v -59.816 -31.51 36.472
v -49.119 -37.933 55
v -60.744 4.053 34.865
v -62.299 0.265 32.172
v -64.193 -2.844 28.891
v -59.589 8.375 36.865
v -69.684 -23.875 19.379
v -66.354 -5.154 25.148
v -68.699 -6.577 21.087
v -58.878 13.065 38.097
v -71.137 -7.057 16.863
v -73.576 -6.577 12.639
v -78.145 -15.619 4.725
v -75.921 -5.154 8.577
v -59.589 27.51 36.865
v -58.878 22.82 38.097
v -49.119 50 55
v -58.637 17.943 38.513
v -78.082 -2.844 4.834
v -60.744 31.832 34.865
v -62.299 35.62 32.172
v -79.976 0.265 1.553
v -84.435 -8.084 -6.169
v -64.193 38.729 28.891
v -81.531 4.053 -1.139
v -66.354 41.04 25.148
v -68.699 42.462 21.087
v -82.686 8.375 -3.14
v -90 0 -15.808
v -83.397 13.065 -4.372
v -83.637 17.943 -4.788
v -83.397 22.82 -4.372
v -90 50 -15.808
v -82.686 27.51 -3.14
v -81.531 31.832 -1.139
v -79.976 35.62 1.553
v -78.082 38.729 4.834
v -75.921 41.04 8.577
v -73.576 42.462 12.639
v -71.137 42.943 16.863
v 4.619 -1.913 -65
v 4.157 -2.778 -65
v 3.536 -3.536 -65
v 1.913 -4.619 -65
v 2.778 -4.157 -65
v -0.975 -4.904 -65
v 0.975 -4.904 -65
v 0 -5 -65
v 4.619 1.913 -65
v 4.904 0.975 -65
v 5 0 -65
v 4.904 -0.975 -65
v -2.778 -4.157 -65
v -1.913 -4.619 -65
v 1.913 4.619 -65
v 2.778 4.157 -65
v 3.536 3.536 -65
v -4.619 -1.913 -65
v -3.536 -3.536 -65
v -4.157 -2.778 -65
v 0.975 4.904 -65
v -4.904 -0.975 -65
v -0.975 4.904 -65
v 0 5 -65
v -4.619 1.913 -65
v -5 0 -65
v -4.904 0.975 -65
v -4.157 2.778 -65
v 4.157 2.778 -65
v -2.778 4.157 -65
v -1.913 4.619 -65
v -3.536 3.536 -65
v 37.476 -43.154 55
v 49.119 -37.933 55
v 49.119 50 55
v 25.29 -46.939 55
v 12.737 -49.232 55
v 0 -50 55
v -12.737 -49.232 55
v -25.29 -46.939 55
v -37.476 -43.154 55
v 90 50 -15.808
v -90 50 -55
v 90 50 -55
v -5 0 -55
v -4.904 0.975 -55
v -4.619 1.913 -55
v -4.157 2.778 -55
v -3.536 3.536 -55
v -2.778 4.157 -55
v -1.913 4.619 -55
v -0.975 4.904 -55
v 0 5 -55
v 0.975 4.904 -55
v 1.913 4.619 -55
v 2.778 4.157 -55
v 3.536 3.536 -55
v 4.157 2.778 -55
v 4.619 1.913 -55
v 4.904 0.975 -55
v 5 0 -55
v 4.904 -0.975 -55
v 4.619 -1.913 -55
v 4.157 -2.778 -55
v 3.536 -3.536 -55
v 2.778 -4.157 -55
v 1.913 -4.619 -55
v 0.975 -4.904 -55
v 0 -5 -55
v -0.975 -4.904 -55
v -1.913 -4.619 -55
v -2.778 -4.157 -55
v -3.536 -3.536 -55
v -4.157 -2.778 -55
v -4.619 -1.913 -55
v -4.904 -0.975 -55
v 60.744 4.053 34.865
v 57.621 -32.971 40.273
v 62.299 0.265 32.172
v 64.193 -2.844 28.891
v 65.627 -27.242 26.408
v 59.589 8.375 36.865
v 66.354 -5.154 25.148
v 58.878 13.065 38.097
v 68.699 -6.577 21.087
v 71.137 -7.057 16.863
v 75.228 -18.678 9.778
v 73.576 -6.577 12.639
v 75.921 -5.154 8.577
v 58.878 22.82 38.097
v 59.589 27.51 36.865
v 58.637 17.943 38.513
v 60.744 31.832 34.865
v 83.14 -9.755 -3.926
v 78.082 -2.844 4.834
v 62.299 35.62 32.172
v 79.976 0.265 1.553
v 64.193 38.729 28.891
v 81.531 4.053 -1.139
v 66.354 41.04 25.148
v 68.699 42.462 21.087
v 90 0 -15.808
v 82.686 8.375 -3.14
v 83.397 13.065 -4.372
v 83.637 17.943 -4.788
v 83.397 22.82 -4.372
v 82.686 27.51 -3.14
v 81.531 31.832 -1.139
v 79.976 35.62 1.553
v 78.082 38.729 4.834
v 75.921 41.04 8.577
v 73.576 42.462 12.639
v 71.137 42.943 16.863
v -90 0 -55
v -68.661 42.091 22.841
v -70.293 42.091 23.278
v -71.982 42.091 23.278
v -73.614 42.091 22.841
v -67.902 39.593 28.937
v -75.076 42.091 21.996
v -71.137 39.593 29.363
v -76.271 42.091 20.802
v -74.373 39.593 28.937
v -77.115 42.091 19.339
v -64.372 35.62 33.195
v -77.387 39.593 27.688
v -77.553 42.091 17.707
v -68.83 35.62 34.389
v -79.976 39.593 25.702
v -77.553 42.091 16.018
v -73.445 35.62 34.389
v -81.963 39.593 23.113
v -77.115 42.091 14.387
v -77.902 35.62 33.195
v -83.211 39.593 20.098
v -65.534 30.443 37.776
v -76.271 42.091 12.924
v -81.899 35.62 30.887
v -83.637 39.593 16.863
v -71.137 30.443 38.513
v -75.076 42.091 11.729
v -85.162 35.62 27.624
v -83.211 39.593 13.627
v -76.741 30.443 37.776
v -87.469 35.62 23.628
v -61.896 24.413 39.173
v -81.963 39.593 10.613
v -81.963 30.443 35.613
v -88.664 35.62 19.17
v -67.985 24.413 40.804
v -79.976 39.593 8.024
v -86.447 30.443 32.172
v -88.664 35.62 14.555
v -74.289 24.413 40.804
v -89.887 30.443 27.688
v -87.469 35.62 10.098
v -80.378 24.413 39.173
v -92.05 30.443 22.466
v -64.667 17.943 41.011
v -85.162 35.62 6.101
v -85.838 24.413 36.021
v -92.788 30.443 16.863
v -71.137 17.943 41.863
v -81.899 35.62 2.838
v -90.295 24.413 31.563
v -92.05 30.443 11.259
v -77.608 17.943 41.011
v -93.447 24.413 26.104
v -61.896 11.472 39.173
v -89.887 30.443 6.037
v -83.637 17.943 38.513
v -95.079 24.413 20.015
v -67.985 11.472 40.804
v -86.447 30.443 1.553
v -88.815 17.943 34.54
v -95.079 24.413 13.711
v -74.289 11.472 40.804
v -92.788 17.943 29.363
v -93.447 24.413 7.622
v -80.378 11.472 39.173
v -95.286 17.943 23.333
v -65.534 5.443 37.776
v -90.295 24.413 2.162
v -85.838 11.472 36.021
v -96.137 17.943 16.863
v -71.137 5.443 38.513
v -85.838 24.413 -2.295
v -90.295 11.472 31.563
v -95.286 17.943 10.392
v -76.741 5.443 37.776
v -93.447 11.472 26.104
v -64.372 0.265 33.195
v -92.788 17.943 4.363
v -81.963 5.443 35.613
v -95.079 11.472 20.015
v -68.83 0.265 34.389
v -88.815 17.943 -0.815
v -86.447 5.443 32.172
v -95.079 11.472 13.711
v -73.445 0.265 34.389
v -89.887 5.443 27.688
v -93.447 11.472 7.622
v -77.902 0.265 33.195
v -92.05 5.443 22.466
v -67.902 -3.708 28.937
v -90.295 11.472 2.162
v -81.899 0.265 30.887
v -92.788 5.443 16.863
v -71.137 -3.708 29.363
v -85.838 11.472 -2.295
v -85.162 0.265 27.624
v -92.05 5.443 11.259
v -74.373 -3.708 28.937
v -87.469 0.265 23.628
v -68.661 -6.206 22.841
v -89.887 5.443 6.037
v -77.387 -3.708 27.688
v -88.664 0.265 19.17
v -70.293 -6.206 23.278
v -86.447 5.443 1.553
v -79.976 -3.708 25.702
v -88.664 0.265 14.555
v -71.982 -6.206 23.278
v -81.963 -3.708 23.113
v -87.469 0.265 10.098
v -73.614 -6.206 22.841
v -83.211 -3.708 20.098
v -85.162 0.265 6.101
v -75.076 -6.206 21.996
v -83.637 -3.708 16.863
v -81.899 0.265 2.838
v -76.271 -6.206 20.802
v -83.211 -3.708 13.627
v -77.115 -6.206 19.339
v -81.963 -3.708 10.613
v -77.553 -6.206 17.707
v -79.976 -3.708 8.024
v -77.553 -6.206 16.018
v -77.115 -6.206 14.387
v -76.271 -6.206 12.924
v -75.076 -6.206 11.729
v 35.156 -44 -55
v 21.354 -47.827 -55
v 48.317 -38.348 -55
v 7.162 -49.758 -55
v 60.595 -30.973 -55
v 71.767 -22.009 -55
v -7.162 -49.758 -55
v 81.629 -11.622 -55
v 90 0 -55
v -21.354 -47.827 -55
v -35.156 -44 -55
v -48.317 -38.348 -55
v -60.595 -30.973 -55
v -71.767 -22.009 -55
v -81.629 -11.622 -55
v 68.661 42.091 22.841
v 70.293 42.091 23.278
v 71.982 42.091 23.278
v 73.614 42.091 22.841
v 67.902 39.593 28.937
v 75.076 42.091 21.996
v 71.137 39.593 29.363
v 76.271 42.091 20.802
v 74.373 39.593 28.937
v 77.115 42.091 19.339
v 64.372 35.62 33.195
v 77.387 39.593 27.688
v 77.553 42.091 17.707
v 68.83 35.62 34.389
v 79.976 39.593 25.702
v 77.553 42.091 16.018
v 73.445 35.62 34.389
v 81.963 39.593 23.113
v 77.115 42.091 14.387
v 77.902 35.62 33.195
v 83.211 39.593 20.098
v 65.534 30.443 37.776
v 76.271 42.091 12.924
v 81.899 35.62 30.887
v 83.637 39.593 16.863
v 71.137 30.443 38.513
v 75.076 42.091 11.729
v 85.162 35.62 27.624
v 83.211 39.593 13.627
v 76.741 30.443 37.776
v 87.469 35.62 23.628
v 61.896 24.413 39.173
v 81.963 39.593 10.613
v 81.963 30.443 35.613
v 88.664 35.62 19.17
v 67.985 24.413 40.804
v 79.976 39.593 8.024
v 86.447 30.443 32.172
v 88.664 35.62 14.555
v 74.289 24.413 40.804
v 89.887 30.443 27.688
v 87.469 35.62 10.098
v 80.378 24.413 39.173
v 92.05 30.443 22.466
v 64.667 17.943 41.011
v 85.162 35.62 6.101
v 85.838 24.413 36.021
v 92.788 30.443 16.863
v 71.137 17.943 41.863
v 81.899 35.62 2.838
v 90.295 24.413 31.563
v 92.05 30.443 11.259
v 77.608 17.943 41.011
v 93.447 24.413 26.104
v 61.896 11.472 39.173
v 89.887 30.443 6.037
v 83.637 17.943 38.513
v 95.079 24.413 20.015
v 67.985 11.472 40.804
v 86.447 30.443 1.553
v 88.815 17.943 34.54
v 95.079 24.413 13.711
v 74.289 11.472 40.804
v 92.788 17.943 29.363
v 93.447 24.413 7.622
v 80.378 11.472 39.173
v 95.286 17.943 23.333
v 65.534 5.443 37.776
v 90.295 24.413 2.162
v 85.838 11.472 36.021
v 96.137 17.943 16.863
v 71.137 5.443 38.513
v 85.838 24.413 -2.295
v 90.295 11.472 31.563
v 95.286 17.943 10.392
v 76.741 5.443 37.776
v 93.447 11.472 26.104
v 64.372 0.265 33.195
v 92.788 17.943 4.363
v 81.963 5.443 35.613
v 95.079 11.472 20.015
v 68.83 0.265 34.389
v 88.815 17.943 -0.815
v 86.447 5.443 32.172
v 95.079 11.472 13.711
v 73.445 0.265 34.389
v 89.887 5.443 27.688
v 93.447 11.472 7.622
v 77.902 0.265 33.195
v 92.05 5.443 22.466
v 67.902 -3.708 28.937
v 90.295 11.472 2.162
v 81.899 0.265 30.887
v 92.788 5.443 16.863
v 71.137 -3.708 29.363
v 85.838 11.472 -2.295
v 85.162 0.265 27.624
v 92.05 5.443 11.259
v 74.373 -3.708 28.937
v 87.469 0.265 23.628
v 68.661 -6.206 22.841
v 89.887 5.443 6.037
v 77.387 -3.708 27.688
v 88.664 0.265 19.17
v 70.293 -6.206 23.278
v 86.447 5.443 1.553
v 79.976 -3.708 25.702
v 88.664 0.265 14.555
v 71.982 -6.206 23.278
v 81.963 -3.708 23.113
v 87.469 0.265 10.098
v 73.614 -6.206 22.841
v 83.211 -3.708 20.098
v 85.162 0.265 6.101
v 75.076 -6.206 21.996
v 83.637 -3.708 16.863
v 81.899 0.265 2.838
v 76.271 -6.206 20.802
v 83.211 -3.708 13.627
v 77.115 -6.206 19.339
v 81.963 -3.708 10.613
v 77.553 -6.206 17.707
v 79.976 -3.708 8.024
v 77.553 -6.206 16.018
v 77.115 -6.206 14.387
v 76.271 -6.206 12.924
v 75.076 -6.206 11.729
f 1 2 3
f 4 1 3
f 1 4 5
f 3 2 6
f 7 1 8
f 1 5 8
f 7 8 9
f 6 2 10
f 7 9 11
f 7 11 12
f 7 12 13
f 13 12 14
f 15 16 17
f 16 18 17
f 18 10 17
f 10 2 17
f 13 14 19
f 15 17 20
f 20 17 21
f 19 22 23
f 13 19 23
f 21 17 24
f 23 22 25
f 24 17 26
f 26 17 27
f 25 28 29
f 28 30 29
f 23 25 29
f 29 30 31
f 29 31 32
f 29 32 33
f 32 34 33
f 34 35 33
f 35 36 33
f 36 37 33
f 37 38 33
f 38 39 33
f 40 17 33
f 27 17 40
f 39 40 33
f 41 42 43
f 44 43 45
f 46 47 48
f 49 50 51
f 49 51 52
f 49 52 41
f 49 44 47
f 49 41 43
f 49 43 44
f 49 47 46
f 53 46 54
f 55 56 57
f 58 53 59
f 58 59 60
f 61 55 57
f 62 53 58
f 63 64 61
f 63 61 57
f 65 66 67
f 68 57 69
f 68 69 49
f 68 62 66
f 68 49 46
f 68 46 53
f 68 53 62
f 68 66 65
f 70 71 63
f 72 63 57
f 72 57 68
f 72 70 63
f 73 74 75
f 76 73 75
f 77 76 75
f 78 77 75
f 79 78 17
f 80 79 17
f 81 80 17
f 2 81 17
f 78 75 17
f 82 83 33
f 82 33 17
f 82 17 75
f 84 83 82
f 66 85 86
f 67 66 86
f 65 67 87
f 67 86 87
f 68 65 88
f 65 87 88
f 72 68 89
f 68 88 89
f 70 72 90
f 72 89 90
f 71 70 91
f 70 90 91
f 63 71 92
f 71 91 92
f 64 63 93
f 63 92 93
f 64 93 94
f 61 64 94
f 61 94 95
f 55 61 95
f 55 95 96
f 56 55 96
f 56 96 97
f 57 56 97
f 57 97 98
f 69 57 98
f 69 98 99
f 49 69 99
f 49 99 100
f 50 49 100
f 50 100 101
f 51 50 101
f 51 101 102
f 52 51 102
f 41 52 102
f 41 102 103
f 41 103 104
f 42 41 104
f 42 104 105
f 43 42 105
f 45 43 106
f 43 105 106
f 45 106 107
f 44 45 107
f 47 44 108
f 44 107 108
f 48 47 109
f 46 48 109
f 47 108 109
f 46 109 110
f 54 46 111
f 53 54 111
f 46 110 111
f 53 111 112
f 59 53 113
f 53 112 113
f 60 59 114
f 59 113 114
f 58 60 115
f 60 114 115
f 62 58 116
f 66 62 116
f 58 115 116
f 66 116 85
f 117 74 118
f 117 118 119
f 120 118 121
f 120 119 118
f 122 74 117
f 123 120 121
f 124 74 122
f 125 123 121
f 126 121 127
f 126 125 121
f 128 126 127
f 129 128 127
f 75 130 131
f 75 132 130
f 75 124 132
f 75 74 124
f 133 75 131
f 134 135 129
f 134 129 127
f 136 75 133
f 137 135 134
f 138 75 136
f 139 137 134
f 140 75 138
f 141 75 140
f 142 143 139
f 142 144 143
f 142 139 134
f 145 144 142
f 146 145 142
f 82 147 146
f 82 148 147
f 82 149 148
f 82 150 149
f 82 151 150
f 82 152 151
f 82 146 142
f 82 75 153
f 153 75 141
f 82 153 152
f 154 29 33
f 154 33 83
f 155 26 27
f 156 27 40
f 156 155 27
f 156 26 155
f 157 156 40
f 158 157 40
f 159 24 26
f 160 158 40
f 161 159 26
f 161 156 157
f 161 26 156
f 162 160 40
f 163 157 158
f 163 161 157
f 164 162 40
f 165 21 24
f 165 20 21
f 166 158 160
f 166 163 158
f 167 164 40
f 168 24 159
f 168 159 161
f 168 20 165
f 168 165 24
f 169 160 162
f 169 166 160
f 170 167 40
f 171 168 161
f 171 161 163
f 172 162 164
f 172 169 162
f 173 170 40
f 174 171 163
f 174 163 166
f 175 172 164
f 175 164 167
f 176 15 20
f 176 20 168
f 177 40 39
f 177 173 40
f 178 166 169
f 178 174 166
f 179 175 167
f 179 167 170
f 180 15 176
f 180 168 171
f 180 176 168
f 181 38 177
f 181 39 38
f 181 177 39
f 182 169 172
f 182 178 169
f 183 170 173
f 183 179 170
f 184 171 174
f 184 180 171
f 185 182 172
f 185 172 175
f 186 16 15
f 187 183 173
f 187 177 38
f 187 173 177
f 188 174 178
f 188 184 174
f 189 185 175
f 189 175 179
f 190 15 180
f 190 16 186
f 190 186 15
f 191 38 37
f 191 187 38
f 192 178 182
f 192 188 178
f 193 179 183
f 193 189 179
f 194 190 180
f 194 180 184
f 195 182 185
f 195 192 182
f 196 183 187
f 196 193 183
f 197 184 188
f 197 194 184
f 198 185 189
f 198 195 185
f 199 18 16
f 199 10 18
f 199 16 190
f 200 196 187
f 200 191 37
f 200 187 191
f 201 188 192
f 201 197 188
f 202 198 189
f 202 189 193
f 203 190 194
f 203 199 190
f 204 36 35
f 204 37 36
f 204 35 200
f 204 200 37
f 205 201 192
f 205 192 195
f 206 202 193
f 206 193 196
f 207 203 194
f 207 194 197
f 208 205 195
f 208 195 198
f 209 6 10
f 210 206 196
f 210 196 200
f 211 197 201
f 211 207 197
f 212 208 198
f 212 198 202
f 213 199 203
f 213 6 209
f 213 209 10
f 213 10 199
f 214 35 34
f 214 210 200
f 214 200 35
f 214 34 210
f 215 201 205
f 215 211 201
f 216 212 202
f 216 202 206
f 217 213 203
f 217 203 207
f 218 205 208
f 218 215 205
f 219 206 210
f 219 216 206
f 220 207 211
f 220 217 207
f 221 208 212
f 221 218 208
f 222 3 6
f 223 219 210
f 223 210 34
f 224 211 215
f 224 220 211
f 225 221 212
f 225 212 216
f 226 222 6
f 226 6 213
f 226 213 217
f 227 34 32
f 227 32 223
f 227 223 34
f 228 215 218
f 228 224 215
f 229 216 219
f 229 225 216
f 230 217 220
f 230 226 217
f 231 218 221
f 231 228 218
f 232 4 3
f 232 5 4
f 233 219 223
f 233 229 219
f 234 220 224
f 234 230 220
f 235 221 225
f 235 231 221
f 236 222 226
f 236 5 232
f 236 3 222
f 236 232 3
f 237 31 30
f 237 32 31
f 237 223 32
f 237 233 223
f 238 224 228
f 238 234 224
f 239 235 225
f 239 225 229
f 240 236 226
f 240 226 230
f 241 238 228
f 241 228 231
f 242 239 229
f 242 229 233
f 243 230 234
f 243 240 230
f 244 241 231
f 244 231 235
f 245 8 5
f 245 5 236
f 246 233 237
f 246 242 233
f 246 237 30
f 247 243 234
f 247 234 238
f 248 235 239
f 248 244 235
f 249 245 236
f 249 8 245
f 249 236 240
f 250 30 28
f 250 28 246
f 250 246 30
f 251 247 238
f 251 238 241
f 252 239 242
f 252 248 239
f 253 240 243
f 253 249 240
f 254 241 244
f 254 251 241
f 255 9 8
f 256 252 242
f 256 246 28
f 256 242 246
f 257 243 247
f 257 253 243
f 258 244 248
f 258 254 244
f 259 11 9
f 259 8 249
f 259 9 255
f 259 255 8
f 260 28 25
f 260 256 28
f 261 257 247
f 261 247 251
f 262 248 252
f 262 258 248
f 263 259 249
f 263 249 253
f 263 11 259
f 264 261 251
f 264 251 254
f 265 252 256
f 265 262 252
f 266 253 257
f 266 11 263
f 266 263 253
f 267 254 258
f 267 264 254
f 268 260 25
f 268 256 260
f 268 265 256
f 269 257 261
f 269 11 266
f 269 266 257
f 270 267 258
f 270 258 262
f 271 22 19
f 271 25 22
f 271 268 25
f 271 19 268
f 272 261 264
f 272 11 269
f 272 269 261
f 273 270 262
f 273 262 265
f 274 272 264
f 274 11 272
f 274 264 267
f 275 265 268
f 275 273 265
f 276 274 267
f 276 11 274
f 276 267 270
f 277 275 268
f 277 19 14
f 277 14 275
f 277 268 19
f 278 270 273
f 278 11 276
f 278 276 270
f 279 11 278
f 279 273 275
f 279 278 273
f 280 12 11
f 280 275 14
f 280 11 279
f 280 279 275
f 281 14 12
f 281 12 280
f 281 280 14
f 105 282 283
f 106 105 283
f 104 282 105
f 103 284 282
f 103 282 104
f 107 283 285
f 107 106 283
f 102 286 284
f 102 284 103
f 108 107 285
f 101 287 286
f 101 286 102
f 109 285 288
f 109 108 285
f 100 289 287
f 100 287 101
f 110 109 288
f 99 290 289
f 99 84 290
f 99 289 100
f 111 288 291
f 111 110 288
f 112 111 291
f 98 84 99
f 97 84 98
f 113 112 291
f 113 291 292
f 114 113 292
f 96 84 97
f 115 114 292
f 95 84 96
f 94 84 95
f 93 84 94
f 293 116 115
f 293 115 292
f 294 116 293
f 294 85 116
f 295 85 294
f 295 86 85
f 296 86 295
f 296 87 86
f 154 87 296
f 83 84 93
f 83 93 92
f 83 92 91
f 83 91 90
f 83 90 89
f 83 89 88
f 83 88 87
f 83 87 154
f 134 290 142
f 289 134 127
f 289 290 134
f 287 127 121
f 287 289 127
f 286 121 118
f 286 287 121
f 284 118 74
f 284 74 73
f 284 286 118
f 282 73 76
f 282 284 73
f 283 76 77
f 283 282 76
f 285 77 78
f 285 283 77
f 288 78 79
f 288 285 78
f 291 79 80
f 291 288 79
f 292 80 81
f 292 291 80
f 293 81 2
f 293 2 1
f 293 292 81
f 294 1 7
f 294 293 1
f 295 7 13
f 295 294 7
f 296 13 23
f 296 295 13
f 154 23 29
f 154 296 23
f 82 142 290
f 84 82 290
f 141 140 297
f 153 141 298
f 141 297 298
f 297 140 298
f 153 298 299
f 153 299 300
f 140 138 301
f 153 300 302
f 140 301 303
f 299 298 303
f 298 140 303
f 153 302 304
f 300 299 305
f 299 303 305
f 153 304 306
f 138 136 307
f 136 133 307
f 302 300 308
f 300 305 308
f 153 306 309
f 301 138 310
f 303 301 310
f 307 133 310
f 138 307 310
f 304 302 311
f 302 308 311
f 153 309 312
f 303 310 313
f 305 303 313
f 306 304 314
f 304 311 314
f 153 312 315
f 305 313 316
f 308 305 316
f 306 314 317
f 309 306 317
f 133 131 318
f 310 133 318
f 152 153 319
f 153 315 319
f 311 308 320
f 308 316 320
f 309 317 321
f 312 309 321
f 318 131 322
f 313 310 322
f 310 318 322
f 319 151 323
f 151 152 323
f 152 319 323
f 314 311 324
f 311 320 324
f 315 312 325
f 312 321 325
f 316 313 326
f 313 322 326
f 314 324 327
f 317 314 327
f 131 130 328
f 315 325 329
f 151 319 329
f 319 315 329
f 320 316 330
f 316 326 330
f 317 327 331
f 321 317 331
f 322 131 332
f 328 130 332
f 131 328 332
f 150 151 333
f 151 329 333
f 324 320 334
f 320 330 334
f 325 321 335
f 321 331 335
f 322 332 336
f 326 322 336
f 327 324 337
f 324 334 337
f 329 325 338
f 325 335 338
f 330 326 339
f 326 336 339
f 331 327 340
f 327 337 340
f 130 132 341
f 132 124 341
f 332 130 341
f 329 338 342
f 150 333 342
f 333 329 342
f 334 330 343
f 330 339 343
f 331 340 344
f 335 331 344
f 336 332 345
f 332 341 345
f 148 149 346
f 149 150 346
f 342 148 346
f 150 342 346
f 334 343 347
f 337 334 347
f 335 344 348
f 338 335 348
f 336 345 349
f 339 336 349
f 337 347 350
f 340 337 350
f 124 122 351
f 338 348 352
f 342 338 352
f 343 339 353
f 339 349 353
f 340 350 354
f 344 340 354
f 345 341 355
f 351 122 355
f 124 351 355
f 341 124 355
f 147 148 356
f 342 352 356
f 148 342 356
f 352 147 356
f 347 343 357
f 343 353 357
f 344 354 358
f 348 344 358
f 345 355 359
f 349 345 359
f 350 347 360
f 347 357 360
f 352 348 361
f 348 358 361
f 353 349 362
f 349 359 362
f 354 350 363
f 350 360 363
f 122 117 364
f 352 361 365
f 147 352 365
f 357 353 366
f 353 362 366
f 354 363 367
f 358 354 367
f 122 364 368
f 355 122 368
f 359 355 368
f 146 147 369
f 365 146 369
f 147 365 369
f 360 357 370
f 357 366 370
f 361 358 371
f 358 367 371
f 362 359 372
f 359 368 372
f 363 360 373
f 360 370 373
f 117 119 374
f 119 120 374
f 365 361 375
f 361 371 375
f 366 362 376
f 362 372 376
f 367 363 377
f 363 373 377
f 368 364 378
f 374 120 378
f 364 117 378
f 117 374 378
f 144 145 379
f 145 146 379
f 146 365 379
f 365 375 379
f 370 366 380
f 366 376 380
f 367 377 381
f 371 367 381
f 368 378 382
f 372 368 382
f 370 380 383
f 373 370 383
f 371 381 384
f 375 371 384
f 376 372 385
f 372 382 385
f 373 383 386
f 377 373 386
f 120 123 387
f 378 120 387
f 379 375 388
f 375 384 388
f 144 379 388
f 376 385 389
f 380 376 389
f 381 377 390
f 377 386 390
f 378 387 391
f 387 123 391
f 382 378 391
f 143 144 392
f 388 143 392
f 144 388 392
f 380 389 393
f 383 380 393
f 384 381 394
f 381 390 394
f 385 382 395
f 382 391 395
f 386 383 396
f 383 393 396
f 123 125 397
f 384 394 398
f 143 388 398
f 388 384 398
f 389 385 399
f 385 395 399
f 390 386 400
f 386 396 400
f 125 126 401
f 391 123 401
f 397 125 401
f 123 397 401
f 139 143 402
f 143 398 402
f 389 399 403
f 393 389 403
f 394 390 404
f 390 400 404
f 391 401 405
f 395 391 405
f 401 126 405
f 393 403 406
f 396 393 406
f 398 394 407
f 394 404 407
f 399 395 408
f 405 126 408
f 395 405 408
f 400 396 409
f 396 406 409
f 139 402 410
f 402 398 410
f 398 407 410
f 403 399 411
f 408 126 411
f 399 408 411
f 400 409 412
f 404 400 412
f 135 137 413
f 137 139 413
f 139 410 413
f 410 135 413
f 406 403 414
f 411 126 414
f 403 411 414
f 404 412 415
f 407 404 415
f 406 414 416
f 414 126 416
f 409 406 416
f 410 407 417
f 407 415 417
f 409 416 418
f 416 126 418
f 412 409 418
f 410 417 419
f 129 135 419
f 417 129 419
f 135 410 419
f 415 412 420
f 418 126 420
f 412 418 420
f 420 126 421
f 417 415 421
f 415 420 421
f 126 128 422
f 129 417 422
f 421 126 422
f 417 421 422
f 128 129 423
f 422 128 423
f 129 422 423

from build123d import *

# Parameters (mm, degrees)
SKETCH1_W                = 180
SKETCH1_H                = 110
BOSS_EXTRUDE1_DEPTH      = 50
BOSS_EXTRUDE2_DEPTH      = 110
CUT_EXTRUDE1_DEPTH       = 146.344418537
BOSS_EXTRUDE5_DEPTH      = 10
BOSS_EXTRUDE5_DEPTH_BACK = 10
SKETCH5_R                = 5


with BuildPart() as part:
    # Sketch1 → Boss-Extrude1 (new body)
    with BuildSketch(Plane(origin=(0, 0, 0), x_dir=(1, 0, 0), z_dir=(0, 1, 0))):
        Rectangle(SKETCH1_W, SKETCH1_H)
    extrude(amount=BOSS_EXTRUDE1_DEPTH)

    # Sketch2 → Boss-Extrude2 (add)
    with BuildSketch(Plane(origin=(-35, 0, -55), x_dir=(1, 0, 0), z_dir=(0, 0, 1))):
        with BuildLine():
            Line((-55, 0), (125, 0))
            ThreePointArc((125, 0), (35, -50), (-55, 0))
        make_face()
    extrude(amount=BOSS_EXTRUDE2_DEPTH)

    # Sketch3 → Cut-Extrude1 (cut, through all)
    with BuildSketch(Plane(origin=(0, 50, 0), x_dir=(1, 0, 0), z_dir=(0, 1, 0))):
        Polygon((-49.118803686, -55), (-90, 15.808309091), (-90, -55), align=None)
    cut_extrude1 = extrude(amount=-CUT_EXTRUDE1_DEPTH, mode=Mode.SUBTRACT)

    # Mirror1: Cut-Extrude1 across plane
    add(cut_extrude1.mirror(Plane(origin=(0, 0, 0), x_dir=(0, 0, 1), z_dir=(1, 0, 0))), mode=Mode.SUBTRACT)

    # Sketch5 → Boss-Extrude5 (add, two sides: drawn at the far end of the back side and taken through both)
    with BuildSketch(Plane(origin=(0, 0, -55), x_dir=(-1, 0, 0), z_dir=(0, 0, -1)).offset(-BOSS_EXTRUDE5_DEPTH_BACK)):
        Circle(SKETCH5_R)
    extrude(amount=BOSS_EXTRUDE5_DEPTH + BOSS_EXTRUDE5_DEPTH_BACK)

    # Sketch4 → Revolve1 (revolve)
    with BuildSketch(Plane(origin=(-60.654801368, 0, 35.019065898), x_dir=(0.49999999999999495, 0, 0.8660254037844417), z_dir=(-0.8660254037844417, 0, 0.49999999999999495))):
        with BuildLine():
            ThreePointArc((-20.965161058, 42.942576489), (4.034838942, 17.942576489), (-20.965161058, -7.057423511))
            Line((-20.965161058, -7.057423511), (-20.965161058, 42.942576489))
        make_face()
    revolve1 = revolve(axis=Axis((-71.137381897, 42.942576489, 16.862703827), (0, -1, 0)))

    # Mirror2: Revolve1 across plane
    add(revolve1.mirror(Plane(origin=(0, 0, 0), x_dir=(0, 0, 1), z_dir=(1, 0, 0))))


solid = part.part
